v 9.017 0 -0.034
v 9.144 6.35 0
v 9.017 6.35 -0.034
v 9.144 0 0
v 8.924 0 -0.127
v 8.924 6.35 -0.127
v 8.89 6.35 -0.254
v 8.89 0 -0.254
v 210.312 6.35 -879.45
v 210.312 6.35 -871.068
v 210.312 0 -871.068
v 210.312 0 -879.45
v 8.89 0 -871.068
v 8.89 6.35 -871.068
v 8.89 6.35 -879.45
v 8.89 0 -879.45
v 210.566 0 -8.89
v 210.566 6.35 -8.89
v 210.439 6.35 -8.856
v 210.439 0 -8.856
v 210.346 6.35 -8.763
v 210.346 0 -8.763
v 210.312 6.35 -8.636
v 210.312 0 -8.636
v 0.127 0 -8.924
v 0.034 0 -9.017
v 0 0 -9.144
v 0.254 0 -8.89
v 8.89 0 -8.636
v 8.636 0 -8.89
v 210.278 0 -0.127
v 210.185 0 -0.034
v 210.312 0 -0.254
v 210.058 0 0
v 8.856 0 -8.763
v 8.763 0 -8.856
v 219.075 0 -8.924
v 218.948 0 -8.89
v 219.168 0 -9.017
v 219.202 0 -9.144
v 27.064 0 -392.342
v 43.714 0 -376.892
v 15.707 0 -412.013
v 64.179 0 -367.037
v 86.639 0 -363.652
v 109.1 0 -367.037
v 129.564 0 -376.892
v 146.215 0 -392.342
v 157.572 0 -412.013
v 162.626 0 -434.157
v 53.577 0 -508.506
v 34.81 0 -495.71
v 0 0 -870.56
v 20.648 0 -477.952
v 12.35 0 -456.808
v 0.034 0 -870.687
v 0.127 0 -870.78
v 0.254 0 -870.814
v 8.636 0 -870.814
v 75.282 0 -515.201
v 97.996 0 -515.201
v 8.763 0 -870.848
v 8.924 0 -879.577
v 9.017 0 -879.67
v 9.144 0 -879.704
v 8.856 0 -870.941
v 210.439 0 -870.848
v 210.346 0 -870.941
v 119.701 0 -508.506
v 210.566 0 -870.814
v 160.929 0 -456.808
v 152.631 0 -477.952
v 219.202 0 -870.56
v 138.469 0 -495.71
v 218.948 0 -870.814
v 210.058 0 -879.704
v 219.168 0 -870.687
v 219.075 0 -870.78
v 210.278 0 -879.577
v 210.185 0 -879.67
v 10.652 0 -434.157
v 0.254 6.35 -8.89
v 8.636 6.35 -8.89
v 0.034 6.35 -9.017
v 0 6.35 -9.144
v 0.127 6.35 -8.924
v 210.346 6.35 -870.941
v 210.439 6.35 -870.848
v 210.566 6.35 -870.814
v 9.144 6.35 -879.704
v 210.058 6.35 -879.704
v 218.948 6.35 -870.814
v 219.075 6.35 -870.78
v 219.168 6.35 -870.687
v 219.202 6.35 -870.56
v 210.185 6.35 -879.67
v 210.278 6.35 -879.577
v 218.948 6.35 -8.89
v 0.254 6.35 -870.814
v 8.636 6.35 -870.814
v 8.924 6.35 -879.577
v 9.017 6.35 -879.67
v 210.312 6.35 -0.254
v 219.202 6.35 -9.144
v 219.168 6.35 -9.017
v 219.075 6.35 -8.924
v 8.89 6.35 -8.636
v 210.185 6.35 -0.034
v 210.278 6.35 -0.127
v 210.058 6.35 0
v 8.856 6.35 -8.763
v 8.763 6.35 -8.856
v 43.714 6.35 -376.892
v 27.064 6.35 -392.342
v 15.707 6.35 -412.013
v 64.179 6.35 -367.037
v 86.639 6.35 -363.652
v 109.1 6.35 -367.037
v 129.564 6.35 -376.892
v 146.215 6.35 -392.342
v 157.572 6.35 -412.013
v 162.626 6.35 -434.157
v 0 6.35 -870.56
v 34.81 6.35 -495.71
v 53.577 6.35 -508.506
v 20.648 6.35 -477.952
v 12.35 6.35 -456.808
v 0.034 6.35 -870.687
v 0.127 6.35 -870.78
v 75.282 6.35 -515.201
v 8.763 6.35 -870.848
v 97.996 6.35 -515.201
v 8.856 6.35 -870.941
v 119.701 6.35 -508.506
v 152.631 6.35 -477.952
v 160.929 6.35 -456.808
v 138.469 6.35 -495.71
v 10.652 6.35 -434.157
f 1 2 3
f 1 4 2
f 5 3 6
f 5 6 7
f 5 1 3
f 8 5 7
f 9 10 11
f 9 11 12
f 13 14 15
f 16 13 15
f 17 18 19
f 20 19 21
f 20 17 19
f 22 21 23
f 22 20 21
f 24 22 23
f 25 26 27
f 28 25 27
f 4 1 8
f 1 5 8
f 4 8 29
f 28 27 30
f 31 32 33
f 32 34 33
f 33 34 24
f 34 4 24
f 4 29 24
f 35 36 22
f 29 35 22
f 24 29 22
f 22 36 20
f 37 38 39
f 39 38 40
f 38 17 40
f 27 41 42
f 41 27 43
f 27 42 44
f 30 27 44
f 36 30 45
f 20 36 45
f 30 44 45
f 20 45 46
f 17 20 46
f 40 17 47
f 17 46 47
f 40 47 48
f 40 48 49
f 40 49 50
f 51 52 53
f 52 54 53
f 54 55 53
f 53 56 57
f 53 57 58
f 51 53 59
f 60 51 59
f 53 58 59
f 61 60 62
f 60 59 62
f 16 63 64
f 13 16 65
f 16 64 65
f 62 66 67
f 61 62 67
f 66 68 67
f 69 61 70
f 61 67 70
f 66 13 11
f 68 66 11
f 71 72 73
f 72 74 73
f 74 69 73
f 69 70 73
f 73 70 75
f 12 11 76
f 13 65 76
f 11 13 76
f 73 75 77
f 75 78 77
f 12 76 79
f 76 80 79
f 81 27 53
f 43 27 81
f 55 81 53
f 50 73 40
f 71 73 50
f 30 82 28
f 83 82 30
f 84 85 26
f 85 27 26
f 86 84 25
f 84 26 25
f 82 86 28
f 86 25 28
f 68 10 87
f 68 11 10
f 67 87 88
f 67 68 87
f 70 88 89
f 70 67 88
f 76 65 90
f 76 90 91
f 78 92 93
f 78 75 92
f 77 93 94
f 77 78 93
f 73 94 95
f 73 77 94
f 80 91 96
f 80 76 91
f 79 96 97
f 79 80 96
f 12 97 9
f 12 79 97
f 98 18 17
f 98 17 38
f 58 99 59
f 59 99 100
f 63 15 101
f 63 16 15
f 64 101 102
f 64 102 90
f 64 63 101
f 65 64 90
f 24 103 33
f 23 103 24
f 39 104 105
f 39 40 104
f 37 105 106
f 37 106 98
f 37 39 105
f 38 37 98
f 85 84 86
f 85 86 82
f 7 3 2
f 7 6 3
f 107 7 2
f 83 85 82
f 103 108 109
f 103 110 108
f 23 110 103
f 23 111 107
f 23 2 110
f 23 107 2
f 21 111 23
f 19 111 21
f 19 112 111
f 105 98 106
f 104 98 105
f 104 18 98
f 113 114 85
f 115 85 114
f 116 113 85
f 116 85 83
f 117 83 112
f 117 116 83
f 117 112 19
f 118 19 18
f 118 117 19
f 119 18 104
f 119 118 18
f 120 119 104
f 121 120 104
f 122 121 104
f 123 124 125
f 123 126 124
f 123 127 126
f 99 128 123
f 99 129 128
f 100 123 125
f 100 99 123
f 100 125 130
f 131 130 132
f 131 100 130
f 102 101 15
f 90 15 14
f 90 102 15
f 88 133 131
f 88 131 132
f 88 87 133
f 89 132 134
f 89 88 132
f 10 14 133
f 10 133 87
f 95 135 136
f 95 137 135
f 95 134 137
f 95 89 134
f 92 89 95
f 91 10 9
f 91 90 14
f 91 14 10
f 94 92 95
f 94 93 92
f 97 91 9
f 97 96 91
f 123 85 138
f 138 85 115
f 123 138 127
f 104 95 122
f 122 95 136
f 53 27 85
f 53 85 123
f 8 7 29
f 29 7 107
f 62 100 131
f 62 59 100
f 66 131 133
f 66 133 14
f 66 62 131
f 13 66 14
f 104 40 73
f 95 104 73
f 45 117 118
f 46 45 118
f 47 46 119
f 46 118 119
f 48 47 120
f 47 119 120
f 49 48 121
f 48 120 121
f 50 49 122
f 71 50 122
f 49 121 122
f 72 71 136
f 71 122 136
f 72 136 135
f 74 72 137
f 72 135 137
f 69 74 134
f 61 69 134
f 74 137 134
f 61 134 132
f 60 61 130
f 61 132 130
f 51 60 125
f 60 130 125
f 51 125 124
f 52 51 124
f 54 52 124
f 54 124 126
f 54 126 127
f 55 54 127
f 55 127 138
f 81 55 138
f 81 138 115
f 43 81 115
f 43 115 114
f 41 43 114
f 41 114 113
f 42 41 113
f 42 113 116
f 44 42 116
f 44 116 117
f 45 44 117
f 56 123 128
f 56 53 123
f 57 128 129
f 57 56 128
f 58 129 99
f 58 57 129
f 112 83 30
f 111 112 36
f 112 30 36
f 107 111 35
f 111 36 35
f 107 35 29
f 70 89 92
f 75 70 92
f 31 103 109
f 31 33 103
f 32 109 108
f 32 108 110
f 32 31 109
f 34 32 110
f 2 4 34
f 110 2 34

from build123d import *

# Parameters (mm, degrees)
SKETCH1_W           = 219.202
SKETCH1_H           = 879.7036
BOSS_EXTRUDE1_DEPTH = 6.35
SKETCH4_R           = 76.2
SKETCH4_W           = 8.89
SKETCH4_H           = 8.89
CUT_EXTRUDE3_DEPTH  = 907.624653954
FILLET1_R           = 0.254


with BuildPart() as part:
    # Sketch1 → Boss-Extrude1 (new body)
    with BuildSketch(Plane(origin=(0, 0, 0), x_dir=(1, 0, 0), z_dir=(0, 1, 0))):
        with Locations((109.601, 439.8518)):
            Rectangle(SKETCH1_W, SKETCH1_H)
    extrude(amount=BOSS_EXTRUDE1_DEPTH)

    # Sketch4 → Cut-Extrude3 (cut, through all)
    with BuildSketch(Plane(origin=(0, 6.35, 0), x_dir=(1, 0, 0), z_dir=(0, 1, 0))):
        with Locations(Location((86.6394, 439.8518, 0), (0, 0, 270))):
            Circle(SKETCH4_R)
        with Locations((4.445, 4.445)):
            Rectangle(SKETCH4_W, SKETCH4_H)
        with Locations((214.757, 4.445)):
            Rectangle(SKETCH4_W, SKETCH4_H)
        with Locations((214.757, 875.2586)):
            Rectangle(SKETCH4_W, SKETCH4_H)
        with Locations((4.445, 875.2586)):
            Rectangle(SKETCH4_W, SKETCH4_H)
    extrude(amount=-CUT_EXTRUDE3_DEPTH, mode=Mode.SUBTRACT)

    # Fillet1
    fillet1_edges = [part.edges().sort_by_distance(p)[0] for p in [
        (0, 3.175, -870.8136),
        (8.89, 3.175, -879.7036),
        (8.89, 3.175, -870.8136),
        (219.202, 3.175, -870.8136),
        (210.312, 3.175, -870.8136),
        (210.312, 3.175, -879.7036),
        (219.202, 3.175, -8.89),
        (210.312, 3.175, 0),
        (210.312, 3.175, -8.89),
        (0, 3.175, -8.89),
        (8.89, 3.175, -8.89),
        (8.89, 3.175, 0),
    ]]
    fillet(fillet1_edges, radius=FILLET1_R)


solid = part.part
